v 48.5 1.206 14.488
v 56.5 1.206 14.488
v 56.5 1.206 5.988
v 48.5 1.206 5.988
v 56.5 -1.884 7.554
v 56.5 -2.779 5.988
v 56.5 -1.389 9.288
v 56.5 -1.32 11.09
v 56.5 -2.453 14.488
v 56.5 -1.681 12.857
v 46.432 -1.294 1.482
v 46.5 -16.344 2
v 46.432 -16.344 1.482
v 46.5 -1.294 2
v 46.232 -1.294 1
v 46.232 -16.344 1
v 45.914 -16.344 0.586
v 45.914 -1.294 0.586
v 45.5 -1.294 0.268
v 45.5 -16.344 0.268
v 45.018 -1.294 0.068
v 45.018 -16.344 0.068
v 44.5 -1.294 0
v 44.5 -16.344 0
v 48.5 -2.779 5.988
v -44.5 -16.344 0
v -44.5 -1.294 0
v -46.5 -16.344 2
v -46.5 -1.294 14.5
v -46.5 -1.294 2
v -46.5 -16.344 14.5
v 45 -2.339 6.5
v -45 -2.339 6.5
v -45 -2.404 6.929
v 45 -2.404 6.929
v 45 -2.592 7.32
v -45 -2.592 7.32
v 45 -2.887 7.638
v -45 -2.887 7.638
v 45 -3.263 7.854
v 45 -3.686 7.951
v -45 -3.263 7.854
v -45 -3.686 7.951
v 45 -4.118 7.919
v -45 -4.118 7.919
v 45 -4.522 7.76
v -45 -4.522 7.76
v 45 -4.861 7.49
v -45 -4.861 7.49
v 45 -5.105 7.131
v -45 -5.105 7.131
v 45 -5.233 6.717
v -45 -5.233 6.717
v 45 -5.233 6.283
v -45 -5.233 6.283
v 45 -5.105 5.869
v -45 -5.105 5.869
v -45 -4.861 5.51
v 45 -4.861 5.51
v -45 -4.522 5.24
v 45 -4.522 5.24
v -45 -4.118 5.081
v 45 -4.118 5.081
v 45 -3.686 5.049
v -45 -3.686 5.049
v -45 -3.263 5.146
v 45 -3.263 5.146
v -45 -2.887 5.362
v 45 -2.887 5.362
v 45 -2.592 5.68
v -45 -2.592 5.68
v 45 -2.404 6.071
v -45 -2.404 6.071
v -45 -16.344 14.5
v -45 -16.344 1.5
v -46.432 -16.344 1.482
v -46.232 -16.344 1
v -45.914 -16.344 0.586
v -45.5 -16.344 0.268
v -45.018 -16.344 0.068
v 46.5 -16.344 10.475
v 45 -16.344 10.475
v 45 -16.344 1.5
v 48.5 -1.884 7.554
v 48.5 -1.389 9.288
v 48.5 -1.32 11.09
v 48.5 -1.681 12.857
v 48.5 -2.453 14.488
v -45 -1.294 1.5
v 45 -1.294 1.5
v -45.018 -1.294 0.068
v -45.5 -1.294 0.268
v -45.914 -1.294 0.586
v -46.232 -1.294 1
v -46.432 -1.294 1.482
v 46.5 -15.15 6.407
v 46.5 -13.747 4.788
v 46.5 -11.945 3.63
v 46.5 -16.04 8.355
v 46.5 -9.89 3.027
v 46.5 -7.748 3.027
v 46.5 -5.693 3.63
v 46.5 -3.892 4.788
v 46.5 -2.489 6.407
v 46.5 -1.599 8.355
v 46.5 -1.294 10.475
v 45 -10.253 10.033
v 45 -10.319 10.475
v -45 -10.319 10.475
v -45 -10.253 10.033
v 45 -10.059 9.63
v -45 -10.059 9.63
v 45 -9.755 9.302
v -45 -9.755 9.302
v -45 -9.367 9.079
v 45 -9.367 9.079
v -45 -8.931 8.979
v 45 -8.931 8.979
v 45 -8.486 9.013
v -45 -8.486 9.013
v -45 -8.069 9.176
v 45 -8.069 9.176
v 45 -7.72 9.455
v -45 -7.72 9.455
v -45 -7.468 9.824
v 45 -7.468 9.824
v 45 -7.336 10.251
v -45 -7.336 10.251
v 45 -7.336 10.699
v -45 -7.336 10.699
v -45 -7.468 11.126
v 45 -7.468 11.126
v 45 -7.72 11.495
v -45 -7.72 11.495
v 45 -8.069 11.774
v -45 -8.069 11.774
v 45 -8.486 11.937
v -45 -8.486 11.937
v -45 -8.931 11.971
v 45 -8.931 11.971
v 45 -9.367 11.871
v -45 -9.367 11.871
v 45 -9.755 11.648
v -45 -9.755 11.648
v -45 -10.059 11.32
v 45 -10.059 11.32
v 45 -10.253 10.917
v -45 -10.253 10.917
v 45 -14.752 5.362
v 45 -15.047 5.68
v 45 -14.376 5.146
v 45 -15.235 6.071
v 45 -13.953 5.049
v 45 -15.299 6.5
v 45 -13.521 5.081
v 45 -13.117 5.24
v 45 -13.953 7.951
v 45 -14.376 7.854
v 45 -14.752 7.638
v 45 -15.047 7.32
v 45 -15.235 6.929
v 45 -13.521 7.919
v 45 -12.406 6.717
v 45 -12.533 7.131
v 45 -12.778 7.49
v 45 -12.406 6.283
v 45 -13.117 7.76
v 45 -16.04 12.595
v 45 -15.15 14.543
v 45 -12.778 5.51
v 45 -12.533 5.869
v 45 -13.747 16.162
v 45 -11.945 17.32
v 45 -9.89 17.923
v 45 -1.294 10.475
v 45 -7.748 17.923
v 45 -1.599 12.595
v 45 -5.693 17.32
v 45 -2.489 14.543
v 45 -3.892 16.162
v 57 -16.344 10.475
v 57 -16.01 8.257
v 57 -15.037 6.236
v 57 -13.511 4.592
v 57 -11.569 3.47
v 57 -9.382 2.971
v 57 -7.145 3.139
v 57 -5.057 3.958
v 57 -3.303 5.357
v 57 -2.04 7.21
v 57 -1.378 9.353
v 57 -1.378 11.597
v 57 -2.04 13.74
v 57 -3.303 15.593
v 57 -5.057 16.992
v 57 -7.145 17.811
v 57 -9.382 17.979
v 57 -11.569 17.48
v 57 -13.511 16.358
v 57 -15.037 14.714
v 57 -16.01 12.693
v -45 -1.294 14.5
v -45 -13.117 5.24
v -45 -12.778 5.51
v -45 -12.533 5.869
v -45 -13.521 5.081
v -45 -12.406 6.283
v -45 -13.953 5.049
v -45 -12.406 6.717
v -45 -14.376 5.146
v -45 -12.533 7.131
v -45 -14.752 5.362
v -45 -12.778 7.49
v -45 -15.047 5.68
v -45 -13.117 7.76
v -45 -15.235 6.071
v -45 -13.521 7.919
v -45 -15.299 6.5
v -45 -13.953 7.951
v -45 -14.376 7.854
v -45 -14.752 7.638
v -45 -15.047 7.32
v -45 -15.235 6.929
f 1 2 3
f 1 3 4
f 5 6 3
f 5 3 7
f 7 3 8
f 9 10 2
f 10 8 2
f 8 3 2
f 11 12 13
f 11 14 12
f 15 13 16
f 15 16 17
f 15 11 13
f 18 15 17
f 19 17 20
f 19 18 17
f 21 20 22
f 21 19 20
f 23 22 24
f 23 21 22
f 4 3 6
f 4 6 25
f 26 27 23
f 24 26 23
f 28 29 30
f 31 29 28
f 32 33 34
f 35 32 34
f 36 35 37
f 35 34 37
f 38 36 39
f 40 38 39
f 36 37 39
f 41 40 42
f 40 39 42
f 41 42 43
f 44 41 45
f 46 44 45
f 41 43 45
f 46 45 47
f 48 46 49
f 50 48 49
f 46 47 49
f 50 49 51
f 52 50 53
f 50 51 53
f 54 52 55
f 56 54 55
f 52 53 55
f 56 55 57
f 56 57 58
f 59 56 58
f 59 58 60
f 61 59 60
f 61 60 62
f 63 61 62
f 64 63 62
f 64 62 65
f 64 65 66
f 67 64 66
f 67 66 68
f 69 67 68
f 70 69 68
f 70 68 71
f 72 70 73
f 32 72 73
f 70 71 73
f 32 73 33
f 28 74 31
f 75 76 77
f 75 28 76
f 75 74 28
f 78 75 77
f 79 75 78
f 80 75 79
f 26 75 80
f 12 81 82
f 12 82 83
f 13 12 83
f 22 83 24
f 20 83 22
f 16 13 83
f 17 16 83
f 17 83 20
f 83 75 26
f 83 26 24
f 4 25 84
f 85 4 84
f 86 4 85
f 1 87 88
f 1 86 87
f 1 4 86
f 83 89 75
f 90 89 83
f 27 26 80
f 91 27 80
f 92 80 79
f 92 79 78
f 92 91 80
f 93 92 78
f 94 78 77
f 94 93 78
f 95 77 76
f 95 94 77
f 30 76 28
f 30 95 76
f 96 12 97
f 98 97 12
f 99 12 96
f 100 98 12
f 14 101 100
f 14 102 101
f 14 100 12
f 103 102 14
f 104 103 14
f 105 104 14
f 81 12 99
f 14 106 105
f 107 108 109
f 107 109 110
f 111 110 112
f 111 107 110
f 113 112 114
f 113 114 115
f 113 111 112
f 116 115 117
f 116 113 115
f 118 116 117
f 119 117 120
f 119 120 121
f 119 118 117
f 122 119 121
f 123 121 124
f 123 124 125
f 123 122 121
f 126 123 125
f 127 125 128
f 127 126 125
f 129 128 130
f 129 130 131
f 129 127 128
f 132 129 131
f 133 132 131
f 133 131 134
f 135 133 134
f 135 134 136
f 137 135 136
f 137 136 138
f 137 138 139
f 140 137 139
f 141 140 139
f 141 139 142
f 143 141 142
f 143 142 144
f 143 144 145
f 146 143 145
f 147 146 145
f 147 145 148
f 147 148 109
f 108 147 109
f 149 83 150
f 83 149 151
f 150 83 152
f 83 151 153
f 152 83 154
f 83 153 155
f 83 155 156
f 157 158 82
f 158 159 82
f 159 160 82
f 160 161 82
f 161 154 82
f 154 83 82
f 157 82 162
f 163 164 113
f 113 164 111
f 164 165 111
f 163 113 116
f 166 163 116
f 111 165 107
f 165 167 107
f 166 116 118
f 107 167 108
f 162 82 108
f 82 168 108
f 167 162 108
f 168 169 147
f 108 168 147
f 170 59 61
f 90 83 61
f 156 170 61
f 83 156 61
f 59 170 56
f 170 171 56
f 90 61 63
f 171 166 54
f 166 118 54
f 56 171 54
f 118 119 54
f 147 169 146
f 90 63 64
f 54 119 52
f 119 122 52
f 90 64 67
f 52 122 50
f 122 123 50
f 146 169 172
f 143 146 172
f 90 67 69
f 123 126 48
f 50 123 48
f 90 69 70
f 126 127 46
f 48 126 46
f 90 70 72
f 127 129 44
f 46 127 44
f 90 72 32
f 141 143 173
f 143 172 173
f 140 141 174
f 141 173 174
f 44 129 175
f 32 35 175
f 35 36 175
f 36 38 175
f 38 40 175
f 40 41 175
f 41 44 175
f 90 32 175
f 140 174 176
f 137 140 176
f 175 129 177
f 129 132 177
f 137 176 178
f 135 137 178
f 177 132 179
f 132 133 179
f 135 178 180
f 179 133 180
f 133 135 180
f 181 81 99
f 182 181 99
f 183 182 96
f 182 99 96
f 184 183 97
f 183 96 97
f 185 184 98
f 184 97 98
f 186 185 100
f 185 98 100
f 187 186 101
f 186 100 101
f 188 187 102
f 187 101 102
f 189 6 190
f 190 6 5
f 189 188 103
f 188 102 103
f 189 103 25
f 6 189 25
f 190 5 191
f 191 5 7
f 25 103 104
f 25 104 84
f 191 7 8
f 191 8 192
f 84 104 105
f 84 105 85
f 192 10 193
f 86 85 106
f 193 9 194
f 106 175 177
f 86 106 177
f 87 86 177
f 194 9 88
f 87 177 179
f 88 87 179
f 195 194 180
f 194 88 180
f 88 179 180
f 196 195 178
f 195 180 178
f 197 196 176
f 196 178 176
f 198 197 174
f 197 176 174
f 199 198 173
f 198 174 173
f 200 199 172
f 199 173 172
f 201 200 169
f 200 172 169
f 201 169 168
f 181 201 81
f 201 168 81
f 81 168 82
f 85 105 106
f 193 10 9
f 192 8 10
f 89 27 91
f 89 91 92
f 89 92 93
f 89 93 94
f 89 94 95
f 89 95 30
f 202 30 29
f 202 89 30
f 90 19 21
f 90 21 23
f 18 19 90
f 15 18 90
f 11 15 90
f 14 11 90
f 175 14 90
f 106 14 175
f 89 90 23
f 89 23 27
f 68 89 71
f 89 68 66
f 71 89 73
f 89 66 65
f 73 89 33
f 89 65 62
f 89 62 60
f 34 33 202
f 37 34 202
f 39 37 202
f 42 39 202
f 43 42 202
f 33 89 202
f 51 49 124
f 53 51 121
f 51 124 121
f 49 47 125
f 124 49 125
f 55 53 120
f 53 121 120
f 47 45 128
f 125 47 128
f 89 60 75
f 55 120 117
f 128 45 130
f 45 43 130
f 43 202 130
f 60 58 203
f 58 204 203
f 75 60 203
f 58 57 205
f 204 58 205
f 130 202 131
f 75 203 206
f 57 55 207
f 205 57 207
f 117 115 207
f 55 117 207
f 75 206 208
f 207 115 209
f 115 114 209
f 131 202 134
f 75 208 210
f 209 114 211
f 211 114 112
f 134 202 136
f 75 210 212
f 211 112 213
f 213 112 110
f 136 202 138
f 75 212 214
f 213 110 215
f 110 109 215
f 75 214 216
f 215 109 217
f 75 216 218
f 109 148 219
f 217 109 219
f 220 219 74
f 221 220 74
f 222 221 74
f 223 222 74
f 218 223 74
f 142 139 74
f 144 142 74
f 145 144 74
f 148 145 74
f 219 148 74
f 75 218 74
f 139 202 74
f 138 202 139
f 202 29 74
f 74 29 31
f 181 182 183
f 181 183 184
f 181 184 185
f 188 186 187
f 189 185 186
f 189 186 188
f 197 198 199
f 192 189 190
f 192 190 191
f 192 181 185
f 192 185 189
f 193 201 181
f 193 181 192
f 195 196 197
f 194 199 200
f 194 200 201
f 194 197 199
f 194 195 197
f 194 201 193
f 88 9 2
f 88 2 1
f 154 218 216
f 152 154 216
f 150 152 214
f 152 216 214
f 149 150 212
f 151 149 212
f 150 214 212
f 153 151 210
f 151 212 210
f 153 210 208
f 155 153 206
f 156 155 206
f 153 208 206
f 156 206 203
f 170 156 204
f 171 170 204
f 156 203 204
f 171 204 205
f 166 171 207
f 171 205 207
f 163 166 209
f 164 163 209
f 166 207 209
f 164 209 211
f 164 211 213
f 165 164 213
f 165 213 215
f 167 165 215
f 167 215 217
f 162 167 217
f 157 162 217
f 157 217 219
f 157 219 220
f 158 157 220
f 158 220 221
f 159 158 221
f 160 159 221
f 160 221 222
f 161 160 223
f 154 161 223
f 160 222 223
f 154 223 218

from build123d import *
from build123d import SkipClean  # not in build123d's __all__

# Parameters (mm, degrees)
F0_W           = 93
F0_H           = 15.05
F1_DEPTH       = 1.5
F2_W           = 15.05
F2_H           = 13
F3_DEPTH       = 1.5
F4_R           = 2
F6_DEPTH       = 1.5
F7_R           = 2
F9_DEPTH       = 93
F11_DEPTH      = 10.5
F13_DEPTH      = 90
F15_W          = 8
F15_H          = 8.5
F16_DEPTH      = 2.5
F16_DEPTH_BACK = 2.5


# Not quite as in the source:
# - after a boolean that leaves OpenCascade's solid faulty, fix() repairs it
# - a feature names something its author has since deleted; it is built from what else it names


with BuildPart() as f1:
    # F0 (on Top) → F1 (new body)
    with BuildSketch(Plane.XY):
        with Locations((0, -8.8193283182)):
            Rectangle(F0_W, F0_H)
    extrude(amount=F1_DEPTH)

    # F2 (on face) → F3 (join)
    with BuildSketch(Plane(origin=(-46.5, 0, 0), x_dir=(0, -1, 0), z_dir=(-1, 0, 0))):
        with Locations((8.8193283182, 8)):
            Rectangle(F2_W, F2_H)
    extrude(amount=-F3_DEPTH)

    # F4
    f4_edges = [f1.edges().sort_by_distance(p)[0] for p in [
        (-46.5, -8.819328, 0),
    ]]
    fillet(f4_edges, radius=F4_R)

    # F5 (on face) → F6 (join)
    with BuildSketch(Plane.YZ.offset(46.5)):
        with BuildLine():
            Line((-16.3443283182, 10.475), (-16.3443283182, 0))
            Line((-16.3443283182, 0), (-1.2943283182, 0))
            Line((-1.2943283182, 0), (-1.2943283182, 10.475))
            ThreePointArc((-1.2943283182, 10.475), (-8.8193283182, 2.95), (-16.3443283182, 10.475))
        make_face()
        with BuildLine():
            ThreePointArc((-1.2943283182, 10.475), (-8.8193283182, 18), (-16.3443283182, 10.475))
            Line((-16.3443283182, 10.475), (-1.2943283182, 10.475))
        make_face()
        with BuildLine():
            Line((-1.2943283182, 10.475), (-16.3443283182, 10.475))
            ThreePointArc((-16.3443283182, 10.475), (-8.8193283182, 2.95), (-1.2943283182, 10.475))
        make_face()
    extrude(amount=-F6_DEPTH)

    # F7
    f7_edges = [f1.edges().sort_by_distance(p)[0] for p in [
        (46.5, -8.819328, 0),
    ]]
    fillet(f7_edges, radius=F7_R)

    # F8 (on face) → F9 (join)
    with BuildSketch(Plane.YZ.offset(46.5)):
        with BuildLine():
            ThreePointArc((-7.3193283182, 10.475), (-8.8193283182, 11.975), (-10.3193283182, 10.475))
            Line((-10.3193283182, 10.475), (-7.3193283182, 10.475))
        make_face()
        with BuildLine():
            Line((-7.3193283182, 10.475), (-10.3193283182, 10.475))
            ThreePointArc((-10.3193283182, 10.475), (-8.8193283182, 8.975), (-7.3193283182, 10.475))
        make_face()
    extrude(amount=-F9_DEPTH)

    # F10 (on face) → F11 (join)
    with BuildSketch(Plane.YZ.offset(46.5)):
        with BuildLine():
            ThreePointArc((-1.2943283182, 10.475), (-8.8193283182, 18), (-16.3443283182, 10.475))
            Line((-16.3443283182, 10.475), (-1.2943283182, 10.475))
        make_face()
        with BuildLine():
            Line((-1.2943283182, 10.475), (-16.3443283182, 10.475))
            ThreePointArc((-16.3443283182, 10.475), (-8.8193283182, 2.95), (-1.2943283182, 10.475))
        make_face()
    with SkipClean():  # cleaning this boolean's faces spoils the solid; the shape is the same uncleaned
        extrude(amount=F11_DEPTH)

    # F12 (on face) → F13 (join, through all)
    with BuildSketch(Plane.YZ.offset(-45)):
        with BuildLine():
            ThreePointArc((-12.3893283182, 6.5), (-13.8443283182, 7.955), (-15.2993283182, 6.5))
            Line((-15.2993283182, 6.5), (-13.8443283182, 6.5))
            Line((-13.8443283182, 6.5), (-12.3893283182, 6.5))
        make_face()
        with BuildLine():
            Line((-13.8443283182, 6.5), (-15.2993283182, 6.5))
            ThreePointArc((-15.2993283182, 6.5), (-13.8443283182, 5.045), (-12.3893283182, 6.5))
            Line((-12.3893283182, 6.5), (-13.8443283182, 6.5))
        make_face()
        with BuildLine():
            ThreePointArc((-5.2493283182, 6.5), (-3.7943283182, 5.045), (-2.3393283182, 6.5))
            Line((-2.3393283182, 6.5), (-3.7943283182, 6.5))
            Line((-3.7943283182, 6.5), (-5.2493283182, 6.5))
        make_face()
        with BuildLine():
            Line((-3.7943283182, 6.5), (-2.3393283182, 6.5))
            ThreePointArc((-2.3393283182, 6.5), (-3.7943283182, 7.955), (-5.2493283182, 6.5))
            Line((-5.2493283182, 6.5), (-3.7943283182, 6.5))
        make_face()
    extrude(amount=F13_DEPTH)

    add(f1.part.fix(), mode=Mode.REPLACE)

    # F15 (on offset) → F16 (join, two sides)
    with BuildSketch(Plane(origin=(0, -1.2943283182, 0), x_dir=(-1, 0, 0), z_dir=(0, 1, 0))) as f16_sk:
        with Locations((-52.5, 10.2375)):
            Rectangle(F15_W, F15_H)
    extrude(amount=F16_DEPTH)
    extrude(f16_sk.sketch, amount=-F16_DEPTH_BACK)


solid = f1.part
